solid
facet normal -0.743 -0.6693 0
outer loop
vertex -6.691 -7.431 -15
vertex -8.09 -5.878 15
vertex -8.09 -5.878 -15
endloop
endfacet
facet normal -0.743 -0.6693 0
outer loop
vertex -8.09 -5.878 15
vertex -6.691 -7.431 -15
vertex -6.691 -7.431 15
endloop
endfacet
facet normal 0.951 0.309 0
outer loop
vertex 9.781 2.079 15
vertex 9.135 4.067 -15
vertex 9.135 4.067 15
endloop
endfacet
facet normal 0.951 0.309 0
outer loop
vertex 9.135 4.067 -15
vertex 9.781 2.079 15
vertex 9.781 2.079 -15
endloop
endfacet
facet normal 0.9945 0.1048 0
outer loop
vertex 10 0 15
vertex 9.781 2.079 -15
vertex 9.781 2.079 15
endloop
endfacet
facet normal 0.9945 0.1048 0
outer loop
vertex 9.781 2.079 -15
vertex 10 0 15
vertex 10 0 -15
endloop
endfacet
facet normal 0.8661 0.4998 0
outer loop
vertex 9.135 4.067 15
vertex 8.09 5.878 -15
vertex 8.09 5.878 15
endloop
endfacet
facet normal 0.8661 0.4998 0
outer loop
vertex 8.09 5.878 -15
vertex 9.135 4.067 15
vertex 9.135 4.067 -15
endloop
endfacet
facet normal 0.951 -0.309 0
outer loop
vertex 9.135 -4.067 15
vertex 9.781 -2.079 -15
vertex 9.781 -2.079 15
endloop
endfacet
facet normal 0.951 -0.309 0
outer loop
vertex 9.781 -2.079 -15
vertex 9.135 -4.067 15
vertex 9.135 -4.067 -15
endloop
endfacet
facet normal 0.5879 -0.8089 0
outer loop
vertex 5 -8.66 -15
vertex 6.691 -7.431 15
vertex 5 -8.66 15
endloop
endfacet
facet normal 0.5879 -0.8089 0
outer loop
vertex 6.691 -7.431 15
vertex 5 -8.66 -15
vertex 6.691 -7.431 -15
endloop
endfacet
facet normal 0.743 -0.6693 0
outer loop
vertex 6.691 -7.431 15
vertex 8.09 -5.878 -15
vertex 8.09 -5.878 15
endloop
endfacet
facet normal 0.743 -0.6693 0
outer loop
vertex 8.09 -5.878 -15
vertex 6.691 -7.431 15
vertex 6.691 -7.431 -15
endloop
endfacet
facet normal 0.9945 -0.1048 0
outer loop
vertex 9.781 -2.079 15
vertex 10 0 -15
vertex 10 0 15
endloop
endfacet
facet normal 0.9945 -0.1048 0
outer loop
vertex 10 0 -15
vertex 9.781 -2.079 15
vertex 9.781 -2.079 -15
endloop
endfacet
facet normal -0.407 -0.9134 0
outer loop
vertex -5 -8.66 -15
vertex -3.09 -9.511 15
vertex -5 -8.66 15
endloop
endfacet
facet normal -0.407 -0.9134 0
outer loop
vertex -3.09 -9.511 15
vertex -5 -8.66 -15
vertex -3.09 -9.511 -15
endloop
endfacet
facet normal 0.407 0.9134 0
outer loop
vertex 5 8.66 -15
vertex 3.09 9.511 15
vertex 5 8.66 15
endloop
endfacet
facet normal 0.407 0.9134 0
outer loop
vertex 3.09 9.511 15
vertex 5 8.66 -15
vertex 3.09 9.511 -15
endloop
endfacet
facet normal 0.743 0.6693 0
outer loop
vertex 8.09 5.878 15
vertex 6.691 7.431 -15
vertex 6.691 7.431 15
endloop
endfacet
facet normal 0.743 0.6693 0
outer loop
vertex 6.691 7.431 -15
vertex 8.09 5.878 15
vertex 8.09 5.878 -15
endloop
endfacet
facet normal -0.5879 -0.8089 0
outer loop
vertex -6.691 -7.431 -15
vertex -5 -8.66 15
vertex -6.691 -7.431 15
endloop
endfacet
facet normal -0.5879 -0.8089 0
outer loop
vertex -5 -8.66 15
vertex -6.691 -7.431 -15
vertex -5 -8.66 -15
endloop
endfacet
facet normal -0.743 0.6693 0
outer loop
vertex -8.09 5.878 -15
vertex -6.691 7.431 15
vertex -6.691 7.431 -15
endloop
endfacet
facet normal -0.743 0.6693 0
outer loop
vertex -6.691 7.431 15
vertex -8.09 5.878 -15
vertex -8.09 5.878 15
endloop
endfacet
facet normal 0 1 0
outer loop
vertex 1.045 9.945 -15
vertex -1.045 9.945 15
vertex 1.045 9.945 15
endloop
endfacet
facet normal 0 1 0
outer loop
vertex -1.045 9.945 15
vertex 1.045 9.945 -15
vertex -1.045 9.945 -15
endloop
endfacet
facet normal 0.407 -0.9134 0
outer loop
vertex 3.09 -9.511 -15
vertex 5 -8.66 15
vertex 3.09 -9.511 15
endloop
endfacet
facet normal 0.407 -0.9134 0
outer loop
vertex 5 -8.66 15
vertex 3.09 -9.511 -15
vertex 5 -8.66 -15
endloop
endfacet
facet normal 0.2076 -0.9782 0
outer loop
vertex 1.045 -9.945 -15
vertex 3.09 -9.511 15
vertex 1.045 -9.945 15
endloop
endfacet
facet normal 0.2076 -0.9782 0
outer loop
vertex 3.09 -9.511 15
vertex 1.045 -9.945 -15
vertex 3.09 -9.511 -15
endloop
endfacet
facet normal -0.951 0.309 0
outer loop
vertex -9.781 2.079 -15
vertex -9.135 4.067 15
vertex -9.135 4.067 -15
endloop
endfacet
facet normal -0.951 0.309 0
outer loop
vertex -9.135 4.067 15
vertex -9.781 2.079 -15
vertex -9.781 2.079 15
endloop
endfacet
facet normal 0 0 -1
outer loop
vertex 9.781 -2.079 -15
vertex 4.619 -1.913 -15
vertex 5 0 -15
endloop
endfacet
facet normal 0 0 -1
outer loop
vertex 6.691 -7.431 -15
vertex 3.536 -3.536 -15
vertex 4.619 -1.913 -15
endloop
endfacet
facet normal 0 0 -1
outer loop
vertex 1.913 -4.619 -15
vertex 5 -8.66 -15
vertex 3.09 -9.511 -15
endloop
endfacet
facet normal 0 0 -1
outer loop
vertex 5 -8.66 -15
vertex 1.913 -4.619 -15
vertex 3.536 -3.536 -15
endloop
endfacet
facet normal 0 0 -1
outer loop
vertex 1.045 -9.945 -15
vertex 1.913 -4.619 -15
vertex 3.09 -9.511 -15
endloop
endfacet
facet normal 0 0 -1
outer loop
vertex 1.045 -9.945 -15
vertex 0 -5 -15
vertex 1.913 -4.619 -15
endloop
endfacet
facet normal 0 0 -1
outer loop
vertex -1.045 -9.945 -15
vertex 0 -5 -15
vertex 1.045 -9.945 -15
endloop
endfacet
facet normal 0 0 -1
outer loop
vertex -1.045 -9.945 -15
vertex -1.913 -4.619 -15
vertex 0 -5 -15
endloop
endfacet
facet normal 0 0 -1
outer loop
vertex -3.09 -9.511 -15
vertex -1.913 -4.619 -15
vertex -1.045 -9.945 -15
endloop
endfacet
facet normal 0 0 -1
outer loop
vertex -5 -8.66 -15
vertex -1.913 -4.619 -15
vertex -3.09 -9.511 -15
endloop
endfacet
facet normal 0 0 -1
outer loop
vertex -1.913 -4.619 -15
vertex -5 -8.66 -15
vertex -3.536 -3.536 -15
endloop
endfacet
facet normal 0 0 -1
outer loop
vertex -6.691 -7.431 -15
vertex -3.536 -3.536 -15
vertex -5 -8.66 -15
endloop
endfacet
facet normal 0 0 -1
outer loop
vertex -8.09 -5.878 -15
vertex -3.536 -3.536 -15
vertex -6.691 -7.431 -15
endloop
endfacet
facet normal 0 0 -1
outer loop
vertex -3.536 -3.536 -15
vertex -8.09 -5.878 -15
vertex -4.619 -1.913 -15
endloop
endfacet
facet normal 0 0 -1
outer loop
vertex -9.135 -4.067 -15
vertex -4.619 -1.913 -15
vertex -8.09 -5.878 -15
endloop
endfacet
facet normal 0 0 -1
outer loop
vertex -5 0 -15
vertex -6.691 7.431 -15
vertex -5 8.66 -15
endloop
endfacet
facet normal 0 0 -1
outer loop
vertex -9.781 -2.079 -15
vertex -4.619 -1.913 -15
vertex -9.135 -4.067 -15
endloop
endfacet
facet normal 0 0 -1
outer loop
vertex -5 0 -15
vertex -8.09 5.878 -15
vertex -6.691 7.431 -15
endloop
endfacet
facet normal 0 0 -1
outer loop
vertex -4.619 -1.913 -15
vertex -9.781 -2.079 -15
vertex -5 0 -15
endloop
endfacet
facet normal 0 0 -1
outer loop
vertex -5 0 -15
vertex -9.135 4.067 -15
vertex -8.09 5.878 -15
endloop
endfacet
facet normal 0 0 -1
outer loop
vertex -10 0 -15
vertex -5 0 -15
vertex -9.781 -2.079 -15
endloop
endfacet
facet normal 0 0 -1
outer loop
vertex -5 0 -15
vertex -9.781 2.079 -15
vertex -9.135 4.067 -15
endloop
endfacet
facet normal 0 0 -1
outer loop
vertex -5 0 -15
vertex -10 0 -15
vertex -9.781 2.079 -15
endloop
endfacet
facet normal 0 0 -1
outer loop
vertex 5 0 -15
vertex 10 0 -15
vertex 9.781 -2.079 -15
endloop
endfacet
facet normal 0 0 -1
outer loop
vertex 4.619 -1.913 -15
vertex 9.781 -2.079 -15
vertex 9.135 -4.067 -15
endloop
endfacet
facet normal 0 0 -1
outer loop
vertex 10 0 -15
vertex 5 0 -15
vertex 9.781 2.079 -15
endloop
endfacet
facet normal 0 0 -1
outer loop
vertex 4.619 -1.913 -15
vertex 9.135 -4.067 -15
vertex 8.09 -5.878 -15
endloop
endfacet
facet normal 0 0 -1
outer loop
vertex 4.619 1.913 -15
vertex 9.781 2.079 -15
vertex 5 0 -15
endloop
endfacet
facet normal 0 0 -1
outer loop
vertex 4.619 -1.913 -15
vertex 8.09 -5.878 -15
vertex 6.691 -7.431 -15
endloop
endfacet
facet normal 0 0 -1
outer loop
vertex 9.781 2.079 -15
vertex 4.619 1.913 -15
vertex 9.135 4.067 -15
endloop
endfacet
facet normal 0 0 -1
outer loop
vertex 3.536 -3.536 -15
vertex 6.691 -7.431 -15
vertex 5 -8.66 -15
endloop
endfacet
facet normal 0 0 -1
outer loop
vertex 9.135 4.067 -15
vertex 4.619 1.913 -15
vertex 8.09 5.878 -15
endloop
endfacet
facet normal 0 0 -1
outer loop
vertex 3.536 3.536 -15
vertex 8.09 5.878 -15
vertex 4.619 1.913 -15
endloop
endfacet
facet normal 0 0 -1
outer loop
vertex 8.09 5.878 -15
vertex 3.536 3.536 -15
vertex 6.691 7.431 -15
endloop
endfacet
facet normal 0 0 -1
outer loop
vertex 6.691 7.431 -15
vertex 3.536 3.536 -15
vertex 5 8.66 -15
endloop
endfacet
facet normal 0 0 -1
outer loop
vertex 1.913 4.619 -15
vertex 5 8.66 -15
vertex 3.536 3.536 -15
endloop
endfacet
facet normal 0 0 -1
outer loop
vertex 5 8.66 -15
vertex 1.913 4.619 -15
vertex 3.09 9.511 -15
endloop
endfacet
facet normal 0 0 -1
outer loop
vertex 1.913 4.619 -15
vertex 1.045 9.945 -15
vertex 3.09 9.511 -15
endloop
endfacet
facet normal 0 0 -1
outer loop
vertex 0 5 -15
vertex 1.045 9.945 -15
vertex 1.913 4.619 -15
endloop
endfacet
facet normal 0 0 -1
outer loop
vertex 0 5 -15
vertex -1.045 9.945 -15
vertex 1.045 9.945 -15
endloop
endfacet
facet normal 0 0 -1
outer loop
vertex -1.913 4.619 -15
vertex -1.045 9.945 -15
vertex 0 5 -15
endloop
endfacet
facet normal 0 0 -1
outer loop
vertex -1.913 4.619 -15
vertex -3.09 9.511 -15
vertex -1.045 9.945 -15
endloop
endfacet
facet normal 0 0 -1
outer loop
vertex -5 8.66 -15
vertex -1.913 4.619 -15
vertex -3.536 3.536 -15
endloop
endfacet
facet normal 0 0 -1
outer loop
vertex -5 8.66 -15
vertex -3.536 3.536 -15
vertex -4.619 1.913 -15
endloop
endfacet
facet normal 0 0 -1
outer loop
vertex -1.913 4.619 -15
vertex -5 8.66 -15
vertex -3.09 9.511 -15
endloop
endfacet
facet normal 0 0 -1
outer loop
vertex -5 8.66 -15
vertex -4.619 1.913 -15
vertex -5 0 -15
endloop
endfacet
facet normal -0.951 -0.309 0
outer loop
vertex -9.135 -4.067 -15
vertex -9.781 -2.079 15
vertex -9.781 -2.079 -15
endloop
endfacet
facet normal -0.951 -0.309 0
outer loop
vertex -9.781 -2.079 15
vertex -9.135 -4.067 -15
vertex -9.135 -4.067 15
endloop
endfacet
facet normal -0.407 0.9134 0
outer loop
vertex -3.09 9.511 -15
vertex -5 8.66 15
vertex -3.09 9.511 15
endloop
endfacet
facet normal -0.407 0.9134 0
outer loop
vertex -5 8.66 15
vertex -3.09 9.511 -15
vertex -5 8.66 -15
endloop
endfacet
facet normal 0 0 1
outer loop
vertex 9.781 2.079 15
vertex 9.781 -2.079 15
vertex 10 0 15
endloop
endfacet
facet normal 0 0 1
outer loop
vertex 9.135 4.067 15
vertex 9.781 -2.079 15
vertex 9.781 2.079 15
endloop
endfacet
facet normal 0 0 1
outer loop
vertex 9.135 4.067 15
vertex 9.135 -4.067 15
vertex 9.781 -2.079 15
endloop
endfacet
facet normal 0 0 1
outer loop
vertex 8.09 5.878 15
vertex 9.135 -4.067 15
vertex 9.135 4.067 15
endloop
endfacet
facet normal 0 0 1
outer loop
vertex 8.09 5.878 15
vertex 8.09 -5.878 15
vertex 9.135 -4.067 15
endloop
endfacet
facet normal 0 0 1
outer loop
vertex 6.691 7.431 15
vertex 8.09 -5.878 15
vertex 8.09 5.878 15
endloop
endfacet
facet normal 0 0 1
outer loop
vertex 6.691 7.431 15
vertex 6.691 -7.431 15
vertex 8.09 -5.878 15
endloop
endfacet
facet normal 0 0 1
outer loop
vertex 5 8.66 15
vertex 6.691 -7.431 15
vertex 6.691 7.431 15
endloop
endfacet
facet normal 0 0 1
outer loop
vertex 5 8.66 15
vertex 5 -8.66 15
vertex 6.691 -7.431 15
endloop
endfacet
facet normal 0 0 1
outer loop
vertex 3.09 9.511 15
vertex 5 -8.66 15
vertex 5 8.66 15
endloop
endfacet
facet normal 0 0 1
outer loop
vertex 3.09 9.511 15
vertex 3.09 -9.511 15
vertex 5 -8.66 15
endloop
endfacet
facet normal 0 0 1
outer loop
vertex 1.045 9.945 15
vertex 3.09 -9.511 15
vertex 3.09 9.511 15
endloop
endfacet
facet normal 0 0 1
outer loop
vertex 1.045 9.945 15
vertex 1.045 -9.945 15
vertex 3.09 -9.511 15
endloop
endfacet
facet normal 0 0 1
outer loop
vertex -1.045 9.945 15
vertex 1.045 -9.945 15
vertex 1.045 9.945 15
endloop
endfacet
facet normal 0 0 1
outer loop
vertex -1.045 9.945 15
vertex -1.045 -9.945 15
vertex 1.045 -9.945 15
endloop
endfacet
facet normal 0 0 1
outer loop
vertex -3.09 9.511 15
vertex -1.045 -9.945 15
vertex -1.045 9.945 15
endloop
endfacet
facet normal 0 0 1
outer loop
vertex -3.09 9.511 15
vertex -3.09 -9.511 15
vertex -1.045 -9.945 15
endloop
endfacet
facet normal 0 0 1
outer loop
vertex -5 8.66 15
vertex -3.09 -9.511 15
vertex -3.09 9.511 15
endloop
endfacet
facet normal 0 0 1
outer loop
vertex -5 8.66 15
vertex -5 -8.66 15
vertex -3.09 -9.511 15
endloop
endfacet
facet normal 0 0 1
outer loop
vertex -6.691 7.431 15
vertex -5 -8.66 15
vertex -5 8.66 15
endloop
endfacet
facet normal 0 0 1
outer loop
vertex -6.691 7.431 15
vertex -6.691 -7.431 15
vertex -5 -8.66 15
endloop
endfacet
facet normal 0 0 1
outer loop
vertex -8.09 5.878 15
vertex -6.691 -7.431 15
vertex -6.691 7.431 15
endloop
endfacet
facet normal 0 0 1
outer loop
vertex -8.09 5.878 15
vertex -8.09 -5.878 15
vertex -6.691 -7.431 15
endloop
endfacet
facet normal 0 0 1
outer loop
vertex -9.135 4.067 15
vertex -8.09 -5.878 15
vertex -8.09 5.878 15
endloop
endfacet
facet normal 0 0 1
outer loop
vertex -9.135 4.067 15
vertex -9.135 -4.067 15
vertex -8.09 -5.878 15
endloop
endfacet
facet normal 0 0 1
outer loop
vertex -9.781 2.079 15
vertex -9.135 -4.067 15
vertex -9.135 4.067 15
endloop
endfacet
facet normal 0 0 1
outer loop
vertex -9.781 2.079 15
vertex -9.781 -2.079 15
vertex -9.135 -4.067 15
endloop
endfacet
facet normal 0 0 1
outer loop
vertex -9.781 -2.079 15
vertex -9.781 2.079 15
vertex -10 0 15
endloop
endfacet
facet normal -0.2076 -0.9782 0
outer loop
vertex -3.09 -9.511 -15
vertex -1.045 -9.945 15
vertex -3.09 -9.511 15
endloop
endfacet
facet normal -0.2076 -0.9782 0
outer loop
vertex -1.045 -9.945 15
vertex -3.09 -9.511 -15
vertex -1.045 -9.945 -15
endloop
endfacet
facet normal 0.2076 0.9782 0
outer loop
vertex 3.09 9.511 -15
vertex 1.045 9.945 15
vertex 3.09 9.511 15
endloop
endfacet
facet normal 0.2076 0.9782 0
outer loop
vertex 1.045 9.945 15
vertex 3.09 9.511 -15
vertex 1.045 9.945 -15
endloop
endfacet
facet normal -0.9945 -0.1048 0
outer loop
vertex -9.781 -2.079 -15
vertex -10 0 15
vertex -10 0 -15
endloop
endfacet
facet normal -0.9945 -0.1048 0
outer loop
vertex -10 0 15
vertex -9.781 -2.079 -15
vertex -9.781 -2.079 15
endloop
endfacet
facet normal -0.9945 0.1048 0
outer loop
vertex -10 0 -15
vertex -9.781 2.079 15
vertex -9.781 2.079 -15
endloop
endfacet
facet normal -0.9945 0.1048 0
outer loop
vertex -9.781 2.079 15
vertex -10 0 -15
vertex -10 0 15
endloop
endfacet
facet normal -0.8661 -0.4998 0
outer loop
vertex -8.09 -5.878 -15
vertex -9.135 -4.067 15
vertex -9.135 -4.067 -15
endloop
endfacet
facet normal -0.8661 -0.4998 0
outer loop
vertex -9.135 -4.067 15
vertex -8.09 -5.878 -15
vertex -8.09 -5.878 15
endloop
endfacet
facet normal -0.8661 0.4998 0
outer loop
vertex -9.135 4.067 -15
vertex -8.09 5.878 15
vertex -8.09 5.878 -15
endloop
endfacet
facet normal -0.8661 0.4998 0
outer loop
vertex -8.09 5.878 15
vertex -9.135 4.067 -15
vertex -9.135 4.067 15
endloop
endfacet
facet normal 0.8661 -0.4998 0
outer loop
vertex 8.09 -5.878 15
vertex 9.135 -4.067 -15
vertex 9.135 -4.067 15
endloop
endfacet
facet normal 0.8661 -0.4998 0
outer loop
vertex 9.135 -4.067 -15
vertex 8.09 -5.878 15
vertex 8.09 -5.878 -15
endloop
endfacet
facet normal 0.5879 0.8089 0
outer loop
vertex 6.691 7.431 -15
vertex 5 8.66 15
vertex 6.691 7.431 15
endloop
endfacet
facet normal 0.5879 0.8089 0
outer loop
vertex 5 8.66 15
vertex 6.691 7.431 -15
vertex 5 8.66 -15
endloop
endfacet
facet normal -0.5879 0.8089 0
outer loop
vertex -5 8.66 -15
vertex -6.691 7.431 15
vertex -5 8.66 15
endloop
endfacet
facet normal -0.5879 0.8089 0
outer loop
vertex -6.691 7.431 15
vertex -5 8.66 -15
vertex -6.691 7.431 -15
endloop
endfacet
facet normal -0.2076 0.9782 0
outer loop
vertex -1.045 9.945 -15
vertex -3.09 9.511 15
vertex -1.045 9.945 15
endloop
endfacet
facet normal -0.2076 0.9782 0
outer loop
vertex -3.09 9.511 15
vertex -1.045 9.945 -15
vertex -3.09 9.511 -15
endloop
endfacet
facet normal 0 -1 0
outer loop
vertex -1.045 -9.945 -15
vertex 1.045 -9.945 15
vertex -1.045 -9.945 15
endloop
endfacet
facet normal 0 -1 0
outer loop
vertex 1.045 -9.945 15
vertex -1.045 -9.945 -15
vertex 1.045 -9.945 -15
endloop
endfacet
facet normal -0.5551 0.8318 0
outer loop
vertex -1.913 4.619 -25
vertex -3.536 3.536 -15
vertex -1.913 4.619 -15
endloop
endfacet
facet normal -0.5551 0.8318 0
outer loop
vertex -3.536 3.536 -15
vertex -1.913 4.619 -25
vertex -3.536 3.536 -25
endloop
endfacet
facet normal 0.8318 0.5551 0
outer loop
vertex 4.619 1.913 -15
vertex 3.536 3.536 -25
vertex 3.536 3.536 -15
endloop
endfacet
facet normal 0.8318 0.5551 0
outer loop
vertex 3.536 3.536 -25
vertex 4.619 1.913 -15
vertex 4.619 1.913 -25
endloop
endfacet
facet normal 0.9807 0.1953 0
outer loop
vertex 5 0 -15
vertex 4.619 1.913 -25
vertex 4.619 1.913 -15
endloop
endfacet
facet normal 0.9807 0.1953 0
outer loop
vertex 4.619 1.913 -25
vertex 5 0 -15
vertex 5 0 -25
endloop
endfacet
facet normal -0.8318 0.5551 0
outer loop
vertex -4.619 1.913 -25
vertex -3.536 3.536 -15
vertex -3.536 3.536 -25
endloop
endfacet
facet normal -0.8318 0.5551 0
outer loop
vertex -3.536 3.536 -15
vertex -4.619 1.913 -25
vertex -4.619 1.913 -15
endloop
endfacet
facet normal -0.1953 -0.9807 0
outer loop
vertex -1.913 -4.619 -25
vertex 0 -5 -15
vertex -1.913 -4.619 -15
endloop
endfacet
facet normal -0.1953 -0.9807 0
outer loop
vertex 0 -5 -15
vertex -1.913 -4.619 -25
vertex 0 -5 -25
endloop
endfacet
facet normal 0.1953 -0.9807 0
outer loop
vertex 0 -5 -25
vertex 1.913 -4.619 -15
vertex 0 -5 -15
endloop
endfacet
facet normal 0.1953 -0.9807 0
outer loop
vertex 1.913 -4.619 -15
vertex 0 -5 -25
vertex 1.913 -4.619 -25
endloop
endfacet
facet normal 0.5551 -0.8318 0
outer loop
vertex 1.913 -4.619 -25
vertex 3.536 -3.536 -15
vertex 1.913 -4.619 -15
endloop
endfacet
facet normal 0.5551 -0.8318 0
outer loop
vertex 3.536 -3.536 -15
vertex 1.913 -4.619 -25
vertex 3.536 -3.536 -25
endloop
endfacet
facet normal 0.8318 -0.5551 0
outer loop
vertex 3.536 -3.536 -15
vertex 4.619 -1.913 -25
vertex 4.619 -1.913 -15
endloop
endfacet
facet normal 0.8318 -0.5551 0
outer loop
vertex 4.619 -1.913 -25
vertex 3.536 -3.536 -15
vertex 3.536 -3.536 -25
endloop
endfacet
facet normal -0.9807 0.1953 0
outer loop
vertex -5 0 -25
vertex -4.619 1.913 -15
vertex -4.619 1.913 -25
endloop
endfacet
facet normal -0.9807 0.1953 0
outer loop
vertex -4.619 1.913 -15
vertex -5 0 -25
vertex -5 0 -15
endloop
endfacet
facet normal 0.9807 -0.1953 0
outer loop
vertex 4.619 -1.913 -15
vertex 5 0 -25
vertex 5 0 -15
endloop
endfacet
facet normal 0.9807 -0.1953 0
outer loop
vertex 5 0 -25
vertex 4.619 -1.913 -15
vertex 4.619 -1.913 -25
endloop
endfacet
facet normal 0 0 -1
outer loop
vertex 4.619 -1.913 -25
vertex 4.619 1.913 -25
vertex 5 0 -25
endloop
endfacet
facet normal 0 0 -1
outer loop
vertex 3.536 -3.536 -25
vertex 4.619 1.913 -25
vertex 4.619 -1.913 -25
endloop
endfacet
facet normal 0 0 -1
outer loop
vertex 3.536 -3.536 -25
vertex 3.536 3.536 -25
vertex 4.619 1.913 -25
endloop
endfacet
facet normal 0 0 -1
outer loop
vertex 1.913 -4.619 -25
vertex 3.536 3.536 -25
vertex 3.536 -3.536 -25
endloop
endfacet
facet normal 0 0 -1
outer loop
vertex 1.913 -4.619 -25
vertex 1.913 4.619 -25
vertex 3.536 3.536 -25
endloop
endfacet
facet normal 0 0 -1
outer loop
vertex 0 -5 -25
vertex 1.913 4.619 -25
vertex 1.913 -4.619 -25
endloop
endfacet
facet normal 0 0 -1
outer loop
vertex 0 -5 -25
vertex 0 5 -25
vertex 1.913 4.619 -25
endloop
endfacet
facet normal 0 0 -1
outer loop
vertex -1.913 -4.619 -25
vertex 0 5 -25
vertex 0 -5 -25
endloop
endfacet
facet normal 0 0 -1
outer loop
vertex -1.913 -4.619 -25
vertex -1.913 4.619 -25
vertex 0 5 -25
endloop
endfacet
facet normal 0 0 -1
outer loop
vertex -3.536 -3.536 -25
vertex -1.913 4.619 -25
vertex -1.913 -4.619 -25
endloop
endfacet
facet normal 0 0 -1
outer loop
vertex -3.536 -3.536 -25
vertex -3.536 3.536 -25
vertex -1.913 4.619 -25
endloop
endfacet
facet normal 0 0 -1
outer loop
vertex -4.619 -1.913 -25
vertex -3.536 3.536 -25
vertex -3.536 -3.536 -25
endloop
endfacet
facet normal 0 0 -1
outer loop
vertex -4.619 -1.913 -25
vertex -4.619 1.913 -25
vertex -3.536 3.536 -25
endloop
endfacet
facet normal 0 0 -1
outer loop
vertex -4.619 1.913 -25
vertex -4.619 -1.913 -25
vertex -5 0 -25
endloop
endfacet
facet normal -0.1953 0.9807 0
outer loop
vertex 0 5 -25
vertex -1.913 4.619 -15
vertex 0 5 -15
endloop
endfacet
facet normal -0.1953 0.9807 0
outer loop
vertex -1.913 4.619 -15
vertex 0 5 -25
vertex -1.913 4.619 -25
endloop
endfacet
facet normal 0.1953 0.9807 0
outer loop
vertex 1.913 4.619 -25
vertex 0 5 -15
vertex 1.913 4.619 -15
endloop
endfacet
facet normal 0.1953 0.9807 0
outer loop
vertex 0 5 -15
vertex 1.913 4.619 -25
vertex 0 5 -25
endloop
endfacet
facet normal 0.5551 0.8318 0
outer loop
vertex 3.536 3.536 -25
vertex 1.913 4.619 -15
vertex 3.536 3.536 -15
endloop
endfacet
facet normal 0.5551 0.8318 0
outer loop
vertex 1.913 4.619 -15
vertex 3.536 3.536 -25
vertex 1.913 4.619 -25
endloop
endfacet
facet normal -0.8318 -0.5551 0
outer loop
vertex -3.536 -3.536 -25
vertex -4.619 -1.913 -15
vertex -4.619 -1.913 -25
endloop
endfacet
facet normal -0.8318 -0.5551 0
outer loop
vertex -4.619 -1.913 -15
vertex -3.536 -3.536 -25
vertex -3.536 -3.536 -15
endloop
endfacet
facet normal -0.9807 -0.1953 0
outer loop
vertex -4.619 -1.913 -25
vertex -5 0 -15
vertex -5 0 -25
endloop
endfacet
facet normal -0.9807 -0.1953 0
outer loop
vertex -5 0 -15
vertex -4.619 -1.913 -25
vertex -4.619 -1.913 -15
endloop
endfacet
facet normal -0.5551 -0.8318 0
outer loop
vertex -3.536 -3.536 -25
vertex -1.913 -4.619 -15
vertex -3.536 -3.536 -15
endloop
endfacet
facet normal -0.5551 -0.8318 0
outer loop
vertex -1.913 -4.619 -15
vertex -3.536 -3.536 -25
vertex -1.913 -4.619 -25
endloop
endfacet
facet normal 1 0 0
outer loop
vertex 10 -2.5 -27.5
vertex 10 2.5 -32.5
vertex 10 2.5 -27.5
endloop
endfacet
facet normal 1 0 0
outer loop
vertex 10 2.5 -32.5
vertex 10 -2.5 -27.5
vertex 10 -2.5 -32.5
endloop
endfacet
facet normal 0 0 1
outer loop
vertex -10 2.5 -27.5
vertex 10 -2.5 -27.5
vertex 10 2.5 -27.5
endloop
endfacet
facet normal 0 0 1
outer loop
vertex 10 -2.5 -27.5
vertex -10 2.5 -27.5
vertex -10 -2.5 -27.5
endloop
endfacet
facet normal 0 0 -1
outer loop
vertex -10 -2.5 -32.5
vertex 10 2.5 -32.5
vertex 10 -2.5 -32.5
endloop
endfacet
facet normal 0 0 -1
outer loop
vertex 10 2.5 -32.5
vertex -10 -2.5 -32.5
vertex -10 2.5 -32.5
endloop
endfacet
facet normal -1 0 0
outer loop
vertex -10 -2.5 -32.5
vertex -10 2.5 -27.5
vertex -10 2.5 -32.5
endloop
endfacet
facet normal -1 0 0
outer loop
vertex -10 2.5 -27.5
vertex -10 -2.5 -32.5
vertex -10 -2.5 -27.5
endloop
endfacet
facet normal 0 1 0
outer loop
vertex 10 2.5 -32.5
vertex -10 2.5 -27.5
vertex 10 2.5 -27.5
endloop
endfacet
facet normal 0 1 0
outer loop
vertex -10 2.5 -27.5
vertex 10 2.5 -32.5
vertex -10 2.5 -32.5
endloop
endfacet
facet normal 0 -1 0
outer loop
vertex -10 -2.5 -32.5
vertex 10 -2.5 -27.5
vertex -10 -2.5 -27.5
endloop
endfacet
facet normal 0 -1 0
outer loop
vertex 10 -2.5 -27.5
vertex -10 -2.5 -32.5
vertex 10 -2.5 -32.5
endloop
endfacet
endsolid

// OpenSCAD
//
//   Code generated by ChatGPT for the query below
//
//   Can you write me OpenSCAD code to create a model of a spatula?
//
//   Created Jan 2023 by Jenny List, for a Hackaday article.
//


module spatula() {
  union() {
    cylinder(r=10, h=30, center=true);
    translate([0, 0, -15]) cylinder(r=5, h=20, center=true);
    translate([0, 0, -30]) cube([20, 5, 5], center=true);
  }
}

spatula();
